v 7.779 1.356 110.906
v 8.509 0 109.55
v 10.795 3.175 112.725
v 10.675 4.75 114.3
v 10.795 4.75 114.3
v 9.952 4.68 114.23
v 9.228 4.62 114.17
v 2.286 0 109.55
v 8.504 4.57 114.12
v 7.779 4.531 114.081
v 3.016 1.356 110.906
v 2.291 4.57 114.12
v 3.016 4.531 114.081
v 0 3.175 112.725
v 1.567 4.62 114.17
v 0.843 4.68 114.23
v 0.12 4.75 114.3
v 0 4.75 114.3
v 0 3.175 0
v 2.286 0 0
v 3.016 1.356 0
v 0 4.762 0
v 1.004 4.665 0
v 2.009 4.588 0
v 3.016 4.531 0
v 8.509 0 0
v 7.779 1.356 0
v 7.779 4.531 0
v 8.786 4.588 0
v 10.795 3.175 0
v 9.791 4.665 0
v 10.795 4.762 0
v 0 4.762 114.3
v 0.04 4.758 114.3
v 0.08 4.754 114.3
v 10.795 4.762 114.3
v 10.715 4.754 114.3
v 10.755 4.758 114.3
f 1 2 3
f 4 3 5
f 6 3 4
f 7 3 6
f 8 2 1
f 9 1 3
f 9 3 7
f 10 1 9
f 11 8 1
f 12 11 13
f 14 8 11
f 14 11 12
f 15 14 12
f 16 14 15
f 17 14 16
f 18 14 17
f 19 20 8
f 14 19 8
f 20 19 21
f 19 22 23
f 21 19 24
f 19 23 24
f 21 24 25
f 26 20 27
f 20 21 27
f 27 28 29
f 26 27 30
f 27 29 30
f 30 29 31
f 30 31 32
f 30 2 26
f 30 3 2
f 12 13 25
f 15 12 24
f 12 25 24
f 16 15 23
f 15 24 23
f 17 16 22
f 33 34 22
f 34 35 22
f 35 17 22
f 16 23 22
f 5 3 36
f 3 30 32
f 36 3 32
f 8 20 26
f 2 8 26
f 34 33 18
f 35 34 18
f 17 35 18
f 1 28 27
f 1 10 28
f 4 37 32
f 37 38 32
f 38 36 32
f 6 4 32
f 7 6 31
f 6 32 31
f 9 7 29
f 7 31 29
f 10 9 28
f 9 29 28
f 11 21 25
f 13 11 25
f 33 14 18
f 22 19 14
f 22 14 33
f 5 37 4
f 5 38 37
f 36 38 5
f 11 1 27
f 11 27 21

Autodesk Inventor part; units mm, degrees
ref_plane "YZ Plane" through (0, 0, 0) normal (1, 0, 0) x (0, 1, 0)
ref_plane "XZ Plane" through (0, 0, 0) normal (0, 1, 0) x (-1, 0, 0)
ref_plane "XY Plane" through (0, 0, 0) normal (0, 0, 1) x (1, 0, 0)
sketch "Sketch1" plane through (0, 0, 0) normal (0, 0, 1) x (1, 0, 0)
  line L0 (0, 0) -> (10.795, 0)
  line L1 (10.795, 0) -> (10.795, 4.7625)
  line L2 (0, 0) -> (0, 4.7625)
  arc A0 (0, 4.7625) -> (10.795, 4.7625) centre (5.3975, 55.2749) ccw
  dimension "d0" = 50.8
  dimension "d1" = 10.795
  dimension "d2" = 4.7625
extrude "Extrusion1" add sketch "Sketch1" along normal blind 114.3
sketch "Sketch2" plane through (0, 0, 114.3) normal (0, 0, 1) x (1, 0, 0)
  arc A0 (0, 4.7625) -> (10.795, 4.7625) centre (5.3975, 55.2749) ccw projected
  line L0 (3.0162, 4.5308) -> (7.7787, 4.5308)
  line L1 (7.7787, 4.5308) -> (7.7787, 1.3558)
  line L2 (7.7787, 1.3558) -> (3.0162, 1.3558)
  line L3 (3.0162, 1.3558) -> (3.0162, 4.5308)
  point P0 (0, 0)
  point P1 (5.3975, 4.5308)
  point P2 (5.3975, 4.4749)
  dimension "d5" = 4.7625
  dimension "d6" = 3.175
extrude "Extrusion2" cut sketch "Sketch2" against normal through all contours A0 L1 L2 L3
chamfer "Chamfer2" distance 3.175 distance2 2.286 1 edges at (0, 0, 57.15) measured on face at (0, 3.175, 38.1)
chamfer "Chamfer3" distance 2.286 distance2 3.175 1 edges at (10.795, 0, 57.15) measured on face at (5.1223, 0, 38.1)
chamfer "Chamfer6" distance 4.7498 angle 45 1 edges at (5.3975, 0, 114.3)
properties part number "WireGuideToMiniSubExtender" material "ABS Plastic"
